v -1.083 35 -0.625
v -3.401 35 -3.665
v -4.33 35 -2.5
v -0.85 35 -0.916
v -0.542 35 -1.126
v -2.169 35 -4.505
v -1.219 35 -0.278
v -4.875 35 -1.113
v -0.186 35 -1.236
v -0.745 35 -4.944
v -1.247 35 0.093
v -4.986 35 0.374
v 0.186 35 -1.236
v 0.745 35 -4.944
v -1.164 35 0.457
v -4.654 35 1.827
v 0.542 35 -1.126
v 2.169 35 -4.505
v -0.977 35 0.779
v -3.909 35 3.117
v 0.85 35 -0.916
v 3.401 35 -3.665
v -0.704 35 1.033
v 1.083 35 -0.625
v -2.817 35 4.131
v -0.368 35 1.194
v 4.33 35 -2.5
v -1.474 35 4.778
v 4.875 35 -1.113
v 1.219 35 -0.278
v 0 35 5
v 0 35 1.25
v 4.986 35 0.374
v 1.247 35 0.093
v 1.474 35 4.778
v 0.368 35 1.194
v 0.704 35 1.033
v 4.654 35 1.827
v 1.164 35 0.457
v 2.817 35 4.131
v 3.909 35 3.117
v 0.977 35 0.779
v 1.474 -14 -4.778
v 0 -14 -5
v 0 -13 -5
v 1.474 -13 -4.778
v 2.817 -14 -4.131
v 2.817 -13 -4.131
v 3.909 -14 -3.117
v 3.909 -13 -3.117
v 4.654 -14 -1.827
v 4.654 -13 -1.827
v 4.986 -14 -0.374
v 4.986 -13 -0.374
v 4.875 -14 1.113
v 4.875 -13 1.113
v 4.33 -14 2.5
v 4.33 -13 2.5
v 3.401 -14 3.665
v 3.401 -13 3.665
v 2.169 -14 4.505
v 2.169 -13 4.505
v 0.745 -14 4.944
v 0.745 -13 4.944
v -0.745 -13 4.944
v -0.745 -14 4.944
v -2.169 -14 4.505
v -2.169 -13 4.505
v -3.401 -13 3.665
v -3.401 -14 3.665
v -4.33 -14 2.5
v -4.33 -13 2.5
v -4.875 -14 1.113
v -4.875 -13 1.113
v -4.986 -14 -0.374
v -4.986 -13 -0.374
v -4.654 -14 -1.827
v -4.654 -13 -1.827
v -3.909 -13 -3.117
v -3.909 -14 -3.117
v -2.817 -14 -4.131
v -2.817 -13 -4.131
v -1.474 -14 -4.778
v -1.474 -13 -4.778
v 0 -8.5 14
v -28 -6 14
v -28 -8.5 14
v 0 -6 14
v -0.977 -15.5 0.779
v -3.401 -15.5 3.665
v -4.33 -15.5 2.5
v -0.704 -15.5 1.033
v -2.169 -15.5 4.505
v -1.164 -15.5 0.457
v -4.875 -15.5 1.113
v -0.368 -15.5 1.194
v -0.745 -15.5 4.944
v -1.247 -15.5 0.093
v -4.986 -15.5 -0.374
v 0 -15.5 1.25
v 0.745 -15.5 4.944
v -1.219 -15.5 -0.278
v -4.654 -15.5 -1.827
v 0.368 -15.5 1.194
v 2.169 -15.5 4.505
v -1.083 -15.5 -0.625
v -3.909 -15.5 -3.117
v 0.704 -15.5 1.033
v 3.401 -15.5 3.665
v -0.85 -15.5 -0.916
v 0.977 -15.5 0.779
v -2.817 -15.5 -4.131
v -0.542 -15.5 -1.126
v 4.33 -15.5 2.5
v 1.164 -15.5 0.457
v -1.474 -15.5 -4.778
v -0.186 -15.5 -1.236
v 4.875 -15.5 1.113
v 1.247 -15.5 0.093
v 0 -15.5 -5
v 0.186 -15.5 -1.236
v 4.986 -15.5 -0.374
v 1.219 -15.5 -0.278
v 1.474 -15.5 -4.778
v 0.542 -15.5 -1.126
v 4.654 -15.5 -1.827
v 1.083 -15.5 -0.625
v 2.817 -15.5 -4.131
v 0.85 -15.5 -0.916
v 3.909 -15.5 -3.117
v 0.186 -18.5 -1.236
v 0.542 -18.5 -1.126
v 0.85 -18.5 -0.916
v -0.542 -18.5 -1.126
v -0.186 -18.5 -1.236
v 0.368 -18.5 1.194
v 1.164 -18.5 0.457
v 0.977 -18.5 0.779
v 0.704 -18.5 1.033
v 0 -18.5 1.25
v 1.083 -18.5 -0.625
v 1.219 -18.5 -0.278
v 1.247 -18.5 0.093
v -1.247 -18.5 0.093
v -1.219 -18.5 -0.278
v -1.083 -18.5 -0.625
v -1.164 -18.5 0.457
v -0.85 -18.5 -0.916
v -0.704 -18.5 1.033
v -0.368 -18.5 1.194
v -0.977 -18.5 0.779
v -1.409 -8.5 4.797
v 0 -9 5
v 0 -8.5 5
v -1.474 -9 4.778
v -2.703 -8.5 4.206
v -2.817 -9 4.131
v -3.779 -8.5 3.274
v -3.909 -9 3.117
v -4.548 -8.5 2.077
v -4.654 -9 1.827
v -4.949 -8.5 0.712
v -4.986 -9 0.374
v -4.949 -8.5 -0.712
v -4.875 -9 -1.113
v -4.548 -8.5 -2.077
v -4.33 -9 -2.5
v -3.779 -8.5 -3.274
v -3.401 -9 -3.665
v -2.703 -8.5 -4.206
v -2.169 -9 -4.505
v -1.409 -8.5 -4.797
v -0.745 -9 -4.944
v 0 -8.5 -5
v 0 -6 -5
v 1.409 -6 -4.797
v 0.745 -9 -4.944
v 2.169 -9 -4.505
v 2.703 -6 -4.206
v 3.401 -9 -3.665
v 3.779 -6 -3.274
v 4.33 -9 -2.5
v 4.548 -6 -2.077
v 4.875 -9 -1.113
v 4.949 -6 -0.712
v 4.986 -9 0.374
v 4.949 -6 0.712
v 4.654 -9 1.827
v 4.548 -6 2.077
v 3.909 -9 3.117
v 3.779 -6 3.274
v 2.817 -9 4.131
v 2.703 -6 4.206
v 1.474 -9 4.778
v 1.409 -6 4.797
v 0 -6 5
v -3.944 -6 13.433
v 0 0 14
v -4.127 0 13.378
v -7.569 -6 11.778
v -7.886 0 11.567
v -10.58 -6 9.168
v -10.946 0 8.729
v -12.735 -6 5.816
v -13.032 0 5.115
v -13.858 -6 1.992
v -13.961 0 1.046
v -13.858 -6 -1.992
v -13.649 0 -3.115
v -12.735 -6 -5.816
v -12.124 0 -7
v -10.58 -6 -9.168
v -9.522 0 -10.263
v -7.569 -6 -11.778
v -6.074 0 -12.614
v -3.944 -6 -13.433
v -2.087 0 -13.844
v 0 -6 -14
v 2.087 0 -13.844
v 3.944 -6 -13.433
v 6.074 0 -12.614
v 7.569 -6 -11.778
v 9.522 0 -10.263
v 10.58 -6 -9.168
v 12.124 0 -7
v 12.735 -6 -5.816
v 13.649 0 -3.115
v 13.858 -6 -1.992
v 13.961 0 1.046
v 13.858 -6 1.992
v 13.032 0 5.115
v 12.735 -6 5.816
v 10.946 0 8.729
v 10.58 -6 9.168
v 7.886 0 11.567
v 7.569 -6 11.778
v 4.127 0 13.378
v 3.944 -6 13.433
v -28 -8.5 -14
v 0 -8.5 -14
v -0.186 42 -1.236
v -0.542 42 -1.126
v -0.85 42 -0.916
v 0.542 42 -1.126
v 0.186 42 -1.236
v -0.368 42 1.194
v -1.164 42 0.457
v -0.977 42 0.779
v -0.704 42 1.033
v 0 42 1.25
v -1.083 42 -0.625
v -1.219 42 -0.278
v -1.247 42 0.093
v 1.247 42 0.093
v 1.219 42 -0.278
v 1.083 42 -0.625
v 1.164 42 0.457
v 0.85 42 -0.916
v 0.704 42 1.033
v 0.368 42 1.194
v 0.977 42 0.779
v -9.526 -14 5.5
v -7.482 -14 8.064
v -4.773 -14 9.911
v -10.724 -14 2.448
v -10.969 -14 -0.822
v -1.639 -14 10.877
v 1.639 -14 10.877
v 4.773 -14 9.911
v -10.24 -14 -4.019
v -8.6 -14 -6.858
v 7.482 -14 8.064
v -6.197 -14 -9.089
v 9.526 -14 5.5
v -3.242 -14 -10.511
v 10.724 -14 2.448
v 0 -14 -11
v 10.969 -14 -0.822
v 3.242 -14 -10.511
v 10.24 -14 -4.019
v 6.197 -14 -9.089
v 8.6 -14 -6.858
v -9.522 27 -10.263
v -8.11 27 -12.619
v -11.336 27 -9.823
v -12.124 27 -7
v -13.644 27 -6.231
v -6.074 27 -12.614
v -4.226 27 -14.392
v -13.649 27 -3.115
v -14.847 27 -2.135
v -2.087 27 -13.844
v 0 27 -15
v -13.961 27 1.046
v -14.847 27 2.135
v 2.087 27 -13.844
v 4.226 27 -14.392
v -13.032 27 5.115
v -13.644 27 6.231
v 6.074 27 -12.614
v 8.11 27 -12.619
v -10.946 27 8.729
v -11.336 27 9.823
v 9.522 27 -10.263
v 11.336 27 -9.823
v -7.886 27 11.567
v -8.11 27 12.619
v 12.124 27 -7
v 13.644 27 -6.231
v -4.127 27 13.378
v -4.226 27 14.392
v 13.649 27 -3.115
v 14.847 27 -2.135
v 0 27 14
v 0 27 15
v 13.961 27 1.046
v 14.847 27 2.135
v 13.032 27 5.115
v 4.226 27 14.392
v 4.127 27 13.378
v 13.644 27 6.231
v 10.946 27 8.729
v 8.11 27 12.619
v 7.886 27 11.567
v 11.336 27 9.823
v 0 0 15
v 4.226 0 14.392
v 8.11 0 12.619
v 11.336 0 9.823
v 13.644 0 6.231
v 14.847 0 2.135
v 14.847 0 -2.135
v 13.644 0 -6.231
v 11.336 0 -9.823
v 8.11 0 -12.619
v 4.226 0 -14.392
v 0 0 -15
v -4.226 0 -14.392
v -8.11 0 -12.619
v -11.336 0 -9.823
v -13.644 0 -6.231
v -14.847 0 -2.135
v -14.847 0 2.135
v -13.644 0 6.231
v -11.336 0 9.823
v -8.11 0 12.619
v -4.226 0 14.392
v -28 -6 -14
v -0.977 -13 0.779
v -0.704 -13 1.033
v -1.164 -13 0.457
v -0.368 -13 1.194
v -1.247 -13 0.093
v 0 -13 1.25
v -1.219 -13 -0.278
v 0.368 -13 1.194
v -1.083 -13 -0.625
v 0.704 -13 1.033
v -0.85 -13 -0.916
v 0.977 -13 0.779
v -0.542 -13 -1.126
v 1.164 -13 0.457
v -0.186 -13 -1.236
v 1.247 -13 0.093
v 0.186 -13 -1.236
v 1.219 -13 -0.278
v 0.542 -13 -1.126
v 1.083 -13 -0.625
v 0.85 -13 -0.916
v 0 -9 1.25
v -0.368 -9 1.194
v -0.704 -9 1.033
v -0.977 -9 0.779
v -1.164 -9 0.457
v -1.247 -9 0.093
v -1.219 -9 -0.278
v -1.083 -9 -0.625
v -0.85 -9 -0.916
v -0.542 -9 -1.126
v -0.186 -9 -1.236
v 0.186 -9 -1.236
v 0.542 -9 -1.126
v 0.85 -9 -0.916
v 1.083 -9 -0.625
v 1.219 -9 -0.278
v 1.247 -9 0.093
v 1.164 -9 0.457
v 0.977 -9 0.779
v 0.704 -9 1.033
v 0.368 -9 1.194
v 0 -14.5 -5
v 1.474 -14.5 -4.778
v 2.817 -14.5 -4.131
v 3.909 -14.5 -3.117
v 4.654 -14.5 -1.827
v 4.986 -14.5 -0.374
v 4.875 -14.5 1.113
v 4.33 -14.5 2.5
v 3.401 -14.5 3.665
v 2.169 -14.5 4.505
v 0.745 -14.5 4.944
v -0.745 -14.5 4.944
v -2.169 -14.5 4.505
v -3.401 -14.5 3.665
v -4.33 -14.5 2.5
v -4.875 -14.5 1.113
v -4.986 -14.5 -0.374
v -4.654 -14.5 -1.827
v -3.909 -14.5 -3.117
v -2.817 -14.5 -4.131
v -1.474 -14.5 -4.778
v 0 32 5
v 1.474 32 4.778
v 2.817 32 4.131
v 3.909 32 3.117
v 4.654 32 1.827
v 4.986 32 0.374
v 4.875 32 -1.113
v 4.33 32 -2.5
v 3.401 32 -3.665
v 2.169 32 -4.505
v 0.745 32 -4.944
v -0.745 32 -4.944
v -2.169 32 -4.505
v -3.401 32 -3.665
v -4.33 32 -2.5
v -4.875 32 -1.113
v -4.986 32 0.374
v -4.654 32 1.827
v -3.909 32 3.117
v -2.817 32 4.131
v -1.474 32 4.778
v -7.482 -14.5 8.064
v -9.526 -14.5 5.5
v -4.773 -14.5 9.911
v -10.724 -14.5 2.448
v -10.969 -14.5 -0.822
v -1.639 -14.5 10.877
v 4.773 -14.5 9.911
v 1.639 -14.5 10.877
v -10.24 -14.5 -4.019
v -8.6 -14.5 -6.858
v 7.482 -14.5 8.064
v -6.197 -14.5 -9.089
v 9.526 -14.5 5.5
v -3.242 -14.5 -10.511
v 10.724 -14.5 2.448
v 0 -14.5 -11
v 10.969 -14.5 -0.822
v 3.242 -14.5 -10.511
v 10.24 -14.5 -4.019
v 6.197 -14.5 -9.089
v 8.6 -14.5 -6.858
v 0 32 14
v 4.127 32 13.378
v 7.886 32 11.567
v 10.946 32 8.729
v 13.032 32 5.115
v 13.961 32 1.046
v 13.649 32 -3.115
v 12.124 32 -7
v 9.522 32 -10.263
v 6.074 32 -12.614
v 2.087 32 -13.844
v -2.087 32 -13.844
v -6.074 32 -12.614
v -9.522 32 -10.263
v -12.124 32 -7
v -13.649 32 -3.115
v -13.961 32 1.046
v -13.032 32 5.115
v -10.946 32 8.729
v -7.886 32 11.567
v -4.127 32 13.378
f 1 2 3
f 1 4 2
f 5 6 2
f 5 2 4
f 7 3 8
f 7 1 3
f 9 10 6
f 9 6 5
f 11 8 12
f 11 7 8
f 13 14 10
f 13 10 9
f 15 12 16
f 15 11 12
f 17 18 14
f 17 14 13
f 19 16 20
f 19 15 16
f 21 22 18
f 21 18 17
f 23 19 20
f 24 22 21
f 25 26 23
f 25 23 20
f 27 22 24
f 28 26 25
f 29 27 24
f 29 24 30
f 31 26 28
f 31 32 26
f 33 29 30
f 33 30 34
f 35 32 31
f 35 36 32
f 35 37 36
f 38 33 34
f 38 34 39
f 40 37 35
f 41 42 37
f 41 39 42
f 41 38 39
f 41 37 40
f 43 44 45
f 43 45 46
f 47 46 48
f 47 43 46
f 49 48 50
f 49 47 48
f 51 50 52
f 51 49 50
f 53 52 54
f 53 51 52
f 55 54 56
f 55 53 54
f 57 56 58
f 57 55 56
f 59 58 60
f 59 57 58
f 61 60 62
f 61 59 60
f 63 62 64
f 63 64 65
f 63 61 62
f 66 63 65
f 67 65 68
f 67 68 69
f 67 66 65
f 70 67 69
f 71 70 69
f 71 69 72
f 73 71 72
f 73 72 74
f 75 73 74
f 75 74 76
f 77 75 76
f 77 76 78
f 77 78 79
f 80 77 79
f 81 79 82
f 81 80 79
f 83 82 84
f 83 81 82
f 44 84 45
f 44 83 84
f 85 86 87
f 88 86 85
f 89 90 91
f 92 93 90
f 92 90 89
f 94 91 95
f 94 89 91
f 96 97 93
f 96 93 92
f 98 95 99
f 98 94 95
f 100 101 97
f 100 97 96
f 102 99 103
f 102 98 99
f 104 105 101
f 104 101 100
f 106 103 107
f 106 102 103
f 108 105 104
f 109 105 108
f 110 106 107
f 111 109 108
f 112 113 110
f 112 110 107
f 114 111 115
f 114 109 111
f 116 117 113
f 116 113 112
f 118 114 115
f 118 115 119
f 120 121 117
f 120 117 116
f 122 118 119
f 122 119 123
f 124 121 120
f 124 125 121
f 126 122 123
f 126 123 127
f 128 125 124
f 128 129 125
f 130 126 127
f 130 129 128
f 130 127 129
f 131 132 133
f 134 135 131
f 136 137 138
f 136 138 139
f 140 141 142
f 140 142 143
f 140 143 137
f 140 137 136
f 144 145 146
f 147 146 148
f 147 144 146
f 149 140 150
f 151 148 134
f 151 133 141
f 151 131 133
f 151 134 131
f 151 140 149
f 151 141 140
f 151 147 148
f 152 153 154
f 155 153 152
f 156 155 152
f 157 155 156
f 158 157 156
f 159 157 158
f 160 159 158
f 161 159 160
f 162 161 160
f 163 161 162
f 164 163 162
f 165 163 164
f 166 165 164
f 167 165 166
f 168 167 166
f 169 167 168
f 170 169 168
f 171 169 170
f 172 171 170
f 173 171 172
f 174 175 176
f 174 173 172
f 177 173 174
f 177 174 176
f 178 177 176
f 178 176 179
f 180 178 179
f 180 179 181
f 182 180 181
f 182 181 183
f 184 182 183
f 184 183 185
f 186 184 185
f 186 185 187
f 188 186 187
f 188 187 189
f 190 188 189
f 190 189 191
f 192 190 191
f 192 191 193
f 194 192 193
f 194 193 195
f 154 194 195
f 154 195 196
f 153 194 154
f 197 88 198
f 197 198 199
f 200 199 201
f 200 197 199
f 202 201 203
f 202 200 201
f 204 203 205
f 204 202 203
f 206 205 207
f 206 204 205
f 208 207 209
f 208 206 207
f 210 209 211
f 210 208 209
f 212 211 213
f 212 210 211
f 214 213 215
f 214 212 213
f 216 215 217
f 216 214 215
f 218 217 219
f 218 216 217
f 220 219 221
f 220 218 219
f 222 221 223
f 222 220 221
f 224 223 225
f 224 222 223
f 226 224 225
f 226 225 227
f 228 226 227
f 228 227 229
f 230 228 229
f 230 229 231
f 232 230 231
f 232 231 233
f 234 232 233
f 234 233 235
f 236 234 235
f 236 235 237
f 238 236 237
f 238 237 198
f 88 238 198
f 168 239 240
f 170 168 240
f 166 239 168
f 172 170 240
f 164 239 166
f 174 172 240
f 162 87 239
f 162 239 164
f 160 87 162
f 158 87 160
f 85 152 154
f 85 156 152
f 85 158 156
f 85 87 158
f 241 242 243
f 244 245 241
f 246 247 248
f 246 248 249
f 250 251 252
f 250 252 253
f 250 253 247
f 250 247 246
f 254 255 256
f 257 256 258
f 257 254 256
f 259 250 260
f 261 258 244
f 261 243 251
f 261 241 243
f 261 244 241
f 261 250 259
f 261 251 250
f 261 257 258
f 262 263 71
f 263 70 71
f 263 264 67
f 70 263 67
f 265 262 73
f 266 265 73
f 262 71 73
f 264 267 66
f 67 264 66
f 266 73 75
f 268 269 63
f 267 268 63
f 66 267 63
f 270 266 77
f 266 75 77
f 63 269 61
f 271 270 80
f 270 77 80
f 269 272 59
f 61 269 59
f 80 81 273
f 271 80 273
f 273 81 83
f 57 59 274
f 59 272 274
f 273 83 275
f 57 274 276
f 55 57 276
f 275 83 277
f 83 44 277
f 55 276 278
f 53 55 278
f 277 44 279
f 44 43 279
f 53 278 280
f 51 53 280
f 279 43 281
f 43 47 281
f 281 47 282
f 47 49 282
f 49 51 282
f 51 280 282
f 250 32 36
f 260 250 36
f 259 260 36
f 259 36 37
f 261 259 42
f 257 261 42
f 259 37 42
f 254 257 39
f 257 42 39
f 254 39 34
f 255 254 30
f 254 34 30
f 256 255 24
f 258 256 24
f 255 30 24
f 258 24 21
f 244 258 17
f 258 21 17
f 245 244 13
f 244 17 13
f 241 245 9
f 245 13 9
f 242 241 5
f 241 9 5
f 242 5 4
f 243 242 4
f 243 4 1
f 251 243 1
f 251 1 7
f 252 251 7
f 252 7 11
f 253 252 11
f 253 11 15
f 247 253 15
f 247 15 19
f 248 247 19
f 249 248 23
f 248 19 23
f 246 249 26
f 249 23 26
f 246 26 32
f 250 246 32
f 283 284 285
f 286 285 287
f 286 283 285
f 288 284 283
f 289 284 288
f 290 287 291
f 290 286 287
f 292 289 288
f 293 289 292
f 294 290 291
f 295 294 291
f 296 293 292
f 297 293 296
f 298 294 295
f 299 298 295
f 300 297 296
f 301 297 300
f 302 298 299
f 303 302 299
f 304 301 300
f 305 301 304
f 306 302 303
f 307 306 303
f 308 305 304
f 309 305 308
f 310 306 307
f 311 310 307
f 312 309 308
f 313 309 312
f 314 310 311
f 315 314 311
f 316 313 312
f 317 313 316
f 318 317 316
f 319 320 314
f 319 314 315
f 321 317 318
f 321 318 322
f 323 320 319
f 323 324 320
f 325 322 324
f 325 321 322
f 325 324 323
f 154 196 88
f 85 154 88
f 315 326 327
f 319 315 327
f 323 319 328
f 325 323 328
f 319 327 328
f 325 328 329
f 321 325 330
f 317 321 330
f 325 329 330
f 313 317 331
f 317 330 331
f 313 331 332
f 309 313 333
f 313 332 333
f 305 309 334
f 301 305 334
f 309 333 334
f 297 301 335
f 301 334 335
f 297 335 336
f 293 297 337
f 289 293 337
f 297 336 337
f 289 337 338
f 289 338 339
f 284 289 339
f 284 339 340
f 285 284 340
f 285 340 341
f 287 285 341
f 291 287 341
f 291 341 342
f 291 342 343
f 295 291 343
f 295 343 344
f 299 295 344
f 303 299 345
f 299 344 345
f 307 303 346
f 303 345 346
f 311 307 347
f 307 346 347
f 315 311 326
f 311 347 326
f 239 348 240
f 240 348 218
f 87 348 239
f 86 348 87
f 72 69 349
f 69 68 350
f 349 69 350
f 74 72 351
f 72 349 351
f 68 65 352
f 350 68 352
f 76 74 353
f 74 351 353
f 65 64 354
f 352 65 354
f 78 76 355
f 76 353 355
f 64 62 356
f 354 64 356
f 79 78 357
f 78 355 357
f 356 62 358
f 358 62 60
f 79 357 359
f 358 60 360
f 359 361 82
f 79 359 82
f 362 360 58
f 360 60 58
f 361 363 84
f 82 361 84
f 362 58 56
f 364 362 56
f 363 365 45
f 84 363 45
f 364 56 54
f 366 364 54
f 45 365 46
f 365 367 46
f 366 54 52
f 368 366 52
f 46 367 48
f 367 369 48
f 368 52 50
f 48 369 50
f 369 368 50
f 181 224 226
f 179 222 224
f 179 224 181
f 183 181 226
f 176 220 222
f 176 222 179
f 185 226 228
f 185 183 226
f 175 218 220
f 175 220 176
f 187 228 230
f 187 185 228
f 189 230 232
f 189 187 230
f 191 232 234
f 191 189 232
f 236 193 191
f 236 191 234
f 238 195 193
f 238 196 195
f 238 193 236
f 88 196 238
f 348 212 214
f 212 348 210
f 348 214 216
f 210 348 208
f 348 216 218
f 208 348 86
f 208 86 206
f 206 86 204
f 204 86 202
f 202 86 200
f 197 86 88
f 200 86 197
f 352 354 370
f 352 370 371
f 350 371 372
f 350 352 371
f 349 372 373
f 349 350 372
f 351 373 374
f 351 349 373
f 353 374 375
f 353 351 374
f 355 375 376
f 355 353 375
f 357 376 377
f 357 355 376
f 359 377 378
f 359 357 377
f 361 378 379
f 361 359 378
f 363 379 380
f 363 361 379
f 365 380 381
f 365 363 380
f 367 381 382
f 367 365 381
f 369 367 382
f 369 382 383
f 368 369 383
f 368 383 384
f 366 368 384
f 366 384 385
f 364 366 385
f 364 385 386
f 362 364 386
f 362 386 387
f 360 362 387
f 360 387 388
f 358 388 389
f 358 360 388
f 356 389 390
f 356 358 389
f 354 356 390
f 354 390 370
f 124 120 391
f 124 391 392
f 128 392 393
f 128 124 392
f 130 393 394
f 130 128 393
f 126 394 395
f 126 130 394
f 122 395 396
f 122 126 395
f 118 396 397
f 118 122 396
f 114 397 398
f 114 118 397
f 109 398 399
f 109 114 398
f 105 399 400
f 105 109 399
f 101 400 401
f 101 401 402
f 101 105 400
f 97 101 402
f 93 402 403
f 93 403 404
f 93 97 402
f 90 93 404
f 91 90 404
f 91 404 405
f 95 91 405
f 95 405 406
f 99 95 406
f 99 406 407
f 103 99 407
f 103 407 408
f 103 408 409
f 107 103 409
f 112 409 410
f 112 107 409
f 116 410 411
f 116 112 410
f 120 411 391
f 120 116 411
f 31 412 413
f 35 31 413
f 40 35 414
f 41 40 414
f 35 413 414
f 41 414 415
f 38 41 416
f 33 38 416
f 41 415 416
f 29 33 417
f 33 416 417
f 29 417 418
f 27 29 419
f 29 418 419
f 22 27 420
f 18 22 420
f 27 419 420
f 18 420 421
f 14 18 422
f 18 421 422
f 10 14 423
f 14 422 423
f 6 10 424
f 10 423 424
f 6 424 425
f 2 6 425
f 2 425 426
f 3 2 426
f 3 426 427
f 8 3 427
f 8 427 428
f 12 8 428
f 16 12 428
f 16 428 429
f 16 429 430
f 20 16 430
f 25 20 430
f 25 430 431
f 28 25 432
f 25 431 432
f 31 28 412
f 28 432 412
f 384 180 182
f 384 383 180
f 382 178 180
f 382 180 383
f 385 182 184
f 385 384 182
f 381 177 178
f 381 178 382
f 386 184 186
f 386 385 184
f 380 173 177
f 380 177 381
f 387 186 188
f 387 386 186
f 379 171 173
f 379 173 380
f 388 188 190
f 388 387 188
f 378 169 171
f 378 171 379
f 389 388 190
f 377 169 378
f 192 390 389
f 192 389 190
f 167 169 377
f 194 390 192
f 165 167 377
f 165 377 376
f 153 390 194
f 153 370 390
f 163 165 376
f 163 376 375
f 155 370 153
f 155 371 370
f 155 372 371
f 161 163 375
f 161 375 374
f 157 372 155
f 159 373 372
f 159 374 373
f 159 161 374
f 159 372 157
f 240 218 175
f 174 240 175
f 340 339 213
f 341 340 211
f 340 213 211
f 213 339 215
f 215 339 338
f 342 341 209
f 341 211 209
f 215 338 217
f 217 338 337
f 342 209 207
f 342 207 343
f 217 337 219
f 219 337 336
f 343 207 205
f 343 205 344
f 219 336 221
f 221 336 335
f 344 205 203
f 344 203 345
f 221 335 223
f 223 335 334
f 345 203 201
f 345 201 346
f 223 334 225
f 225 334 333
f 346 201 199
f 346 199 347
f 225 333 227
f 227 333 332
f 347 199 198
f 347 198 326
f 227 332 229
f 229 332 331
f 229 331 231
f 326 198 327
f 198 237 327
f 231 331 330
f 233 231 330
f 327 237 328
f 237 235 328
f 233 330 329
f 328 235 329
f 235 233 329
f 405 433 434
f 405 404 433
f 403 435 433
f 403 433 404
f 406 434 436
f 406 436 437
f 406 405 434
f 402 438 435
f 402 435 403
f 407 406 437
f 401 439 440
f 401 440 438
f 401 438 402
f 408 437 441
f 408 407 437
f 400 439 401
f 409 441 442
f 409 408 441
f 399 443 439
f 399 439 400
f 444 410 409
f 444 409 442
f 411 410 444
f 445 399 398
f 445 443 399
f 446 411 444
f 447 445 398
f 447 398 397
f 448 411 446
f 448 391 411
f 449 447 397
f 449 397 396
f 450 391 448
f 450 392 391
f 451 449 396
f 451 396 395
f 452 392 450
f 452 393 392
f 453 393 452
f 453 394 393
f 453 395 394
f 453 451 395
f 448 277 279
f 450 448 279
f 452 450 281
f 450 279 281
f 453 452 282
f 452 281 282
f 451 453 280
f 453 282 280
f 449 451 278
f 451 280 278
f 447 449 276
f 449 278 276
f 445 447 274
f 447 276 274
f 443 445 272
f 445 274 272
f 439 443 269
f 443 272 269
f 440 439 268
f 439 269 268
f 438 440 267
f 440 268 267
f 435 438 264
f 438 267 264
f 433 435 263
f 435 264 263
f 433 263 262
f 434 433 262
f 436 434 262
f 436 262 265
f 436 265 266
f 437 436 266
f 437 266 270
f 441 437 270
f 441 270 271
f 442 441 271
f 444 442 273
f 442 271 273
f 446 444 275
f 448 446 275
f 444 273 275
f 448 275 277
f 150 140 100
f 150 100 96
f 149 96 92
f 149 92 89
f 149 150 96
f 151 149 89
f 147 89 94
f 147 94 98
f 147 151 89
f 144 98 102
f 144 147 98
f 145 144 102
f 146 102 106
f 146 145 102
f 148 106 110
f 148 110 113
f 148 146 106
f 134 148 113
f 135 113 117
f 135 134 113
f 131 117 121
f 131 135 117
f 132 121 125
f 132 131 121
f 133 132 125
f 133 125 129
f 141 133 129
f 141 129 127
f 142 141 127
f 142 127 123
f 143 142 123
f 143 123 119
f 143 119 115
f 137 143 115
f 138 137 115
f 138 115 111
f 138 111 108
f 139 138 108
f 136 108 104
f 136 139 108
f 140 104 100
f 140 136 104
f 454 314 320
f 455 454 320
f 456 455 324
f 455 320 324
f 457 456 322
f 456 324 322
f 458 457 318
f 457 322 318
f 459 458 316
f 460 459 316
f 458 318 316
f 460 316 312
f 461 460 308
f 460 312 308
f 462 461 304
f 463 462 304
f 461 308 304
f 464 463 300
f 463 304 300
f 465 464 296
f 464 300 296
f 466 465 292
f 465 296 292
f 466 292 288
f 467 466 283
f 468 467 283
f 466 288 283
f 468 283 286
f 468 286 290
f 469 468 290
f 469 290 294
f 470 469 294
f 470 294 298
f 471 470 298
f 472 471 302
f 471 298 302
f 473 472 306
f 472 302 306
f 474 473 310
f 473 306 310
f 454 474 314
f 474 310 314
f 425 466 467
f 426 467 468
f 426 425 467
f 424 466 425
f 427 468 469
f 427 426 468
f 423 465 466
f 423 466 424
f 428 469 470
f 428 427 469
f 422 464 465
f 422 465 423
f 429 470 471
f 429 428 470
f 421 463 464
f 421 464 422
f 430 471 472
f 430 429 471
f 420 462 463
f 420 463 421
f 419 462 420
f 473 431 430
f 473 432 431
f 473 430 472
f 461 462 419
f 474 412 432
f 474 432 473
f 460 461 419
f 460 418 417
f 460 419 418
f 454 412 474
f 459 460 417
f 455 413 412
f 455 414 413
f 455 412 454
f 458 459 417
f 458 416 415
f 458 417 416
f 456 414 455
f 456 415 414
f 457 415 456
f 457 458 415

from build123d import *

# Parameters (mm, degrees)
SKETCH1_R            = 15
BOSS_EXTRUDE1_DEPTH  = 27
SKETCH2_R            = 14
BOSS_EXTRUDE2_DEPTH  = 5
SKETCH3_R            = 5
BOSS_EXTRUDE3_DEPTH  = 3
SKETCH4_R            = 1.25
BOSS_EXTRUDE4_DEPTH  = 7
BOSS_EXTRUDE5_START  = 6
SKETCH5_R            = 14
BOSS_EXTRUDE5_DEPTH  = 6
BOSS_EXTRUDE6_START  = 3
SKETCH6_R            = 5
BOSS_EXTRUDE6_DEPTH  = 3
SKETCH7_W            = 28
SKETCH7_H            = 28
BOSS_EXTRUDE7_DEPTH  = 2.5
BOSS_EXTRUDE8_START  = 4
SKETCH8_R            = 1.25
BOSS_EXTRUDE8_DEPTH  = 4
BOSS_EXTRUDE9_START  = 1
SKETCH9_R            = 5
BOSS_EXTRUDE9_DEPTH  = 1
SKETCH10_R           = 11
BOSS_EXTRUDE10_DEPTH = 0.5
BOSS_EXTRUDE11_START = 1
SKETCH11_R           = 5
BOSS_EXTRUDE11_DEPTH = 1
BOSS_EXTRUDE12_START = 3
SKETCH12_R           = 1.25
BOSS_EXTRUDE12_DEPTH = 3


with BuildPart() as part:
    # Sketch1 → Boss-Extrude1 (new body)
    with BuildSketch(Plane(origin=(0, 0, 0), x_dir=(1, 0, 0), z_dir=(0, 1, 0))):
        with Locations(Location((0, 0, 0), (0, 0, 270))):
            Circle(SKETCH1_R)
    extrude(amount=BOSS_EXTRUDE1_DEPTH)

    # Sketch2 → Boss-Extrude2 (add)
    with BuildSketch(Plane(origin=(0, 27, 0), x_dir=(1, 0, 0), z_dir=(0, 1, 0))):
        with Locations(Location((0, 0, 0), (0, 0, 270))):
            Circle(SKETCH2_R)
    extrude(amount=BOSS_EXTRUDE2_DEPTH)

    # Sketch3 → Boss-Extrude3 (add)
    with BuildSketch(Plane(origin=(0, 32, 0), x_dir=(1, 0, 0), z_dir=(0, 1, 0))):
        with Locations(Location((0, 0, 0), (0, 0, 270))):
            Circle(SKETCH3_R)
    extrude(amount=BOSS_EXTRUDE3_DEPTH)

    # Sketch4 → Boss-Extrude4 (add)
    with BuildSketch(Plane(origin=(0, 35, 0), x_dir=(1, 0, 0), z_dir=(0, 1, 0))):
        with Locations(Location((0, 0, 0), (0, 0, 270))):
            Circle(SKETCH4_R)
    extrude(amount=BOSS_EXTRUDE4_DEPTH)

    # Sketch5 → Boss-Extrude5 (add)
    with BuildSketch(Plane.XZ.offset(BOSS_EXTRUDE5_START)):
        with Locations(Location((0, 0, 0), (0, 0, 90))):
            Circle(SKETCH5_R)
    extrude(amount=-BOSS_EXTRUDE5_DEPTH)

    # Sketch6 → Boss-Extrude6 (add)
    with BuildSketch(Plane.XZ.offset(6).offset(BOSS_EXTRUDE6_START)):
        with Locations(Location((0, 0, 0), (0, 0, 90))):
            Circle(SKETCH6_R)
    extrude(amount=-BOSS_EXTRUDE6_DEPTH)

    # Sketch7 → Boss-Extrude7 (add)
    with BuildSketch(Plane.XZ.offset(6)):
        with Locations((-14, 0)):
            Rectangle(SKETCH7_W, SKETCH7_H)
    extrude(amount=BOSS_EXTRUDE7_DEPTH)

    # Sketch8 → Boss-Extrude8 (add)
    with BuildSketch(Plane.XZ.offset(9).offset(BOSS_EXTRUDE8_START)):
        with Locations(Location((0, 0, 0), (0, 0, 90))):
            Circle(SKETCH8_R)
    extrude(amount=-BOSS_EXTRUDE8_DEPTH)

    # Sketch9 → Boss-Extrude9 (add)
    with BuildSketch(Plane.XZ.offset(13).offset(BOSS_EXTRUDE9_START)):
        with Locations(Location((0, 0, 0), (0, 0, 270))):
            Circle(SKETCH9_R)
    extrude(amount=-BOSS_EXTRUDE9_DEPTH)

    # Sketch10 → Boss-Extrude10 (add)
    with BuildSketch(Plane.XZ.offset(14)):
        with Locations(Location((0, 0, 0), (0, 0, 270))):
            Circle(SKETCH10_R)
    extrude(amount=BOSS_EXTRUDE10_DEPTH)

    # Sketch11 → Boss-Extrude11 (add)
    with BuildSketch(Plane.XZ.offset(14.5).offset(BOSS_EXTRUDE11_START)):
        with Locations(Location((0, 0, 0), (0, 0, 270))):
            Circle(SKETCH11_R)
    extrude(amount=-BOSS_EXTRUDE11_DEPTH)

    # Sketch12 → Boss-Extrude12 (add)
    with BuildSketch(Plane.XZ.offset(15.5).offset(BOSS_EXTRUDE12_START)):
        with Locations(Location((0, 0, 0), (0, 0, 90))):
            Circle(SKETCH12_R)
    extrude(amount=-BOSS_EXTRUDE12_DEPTH)


solid = part.part
